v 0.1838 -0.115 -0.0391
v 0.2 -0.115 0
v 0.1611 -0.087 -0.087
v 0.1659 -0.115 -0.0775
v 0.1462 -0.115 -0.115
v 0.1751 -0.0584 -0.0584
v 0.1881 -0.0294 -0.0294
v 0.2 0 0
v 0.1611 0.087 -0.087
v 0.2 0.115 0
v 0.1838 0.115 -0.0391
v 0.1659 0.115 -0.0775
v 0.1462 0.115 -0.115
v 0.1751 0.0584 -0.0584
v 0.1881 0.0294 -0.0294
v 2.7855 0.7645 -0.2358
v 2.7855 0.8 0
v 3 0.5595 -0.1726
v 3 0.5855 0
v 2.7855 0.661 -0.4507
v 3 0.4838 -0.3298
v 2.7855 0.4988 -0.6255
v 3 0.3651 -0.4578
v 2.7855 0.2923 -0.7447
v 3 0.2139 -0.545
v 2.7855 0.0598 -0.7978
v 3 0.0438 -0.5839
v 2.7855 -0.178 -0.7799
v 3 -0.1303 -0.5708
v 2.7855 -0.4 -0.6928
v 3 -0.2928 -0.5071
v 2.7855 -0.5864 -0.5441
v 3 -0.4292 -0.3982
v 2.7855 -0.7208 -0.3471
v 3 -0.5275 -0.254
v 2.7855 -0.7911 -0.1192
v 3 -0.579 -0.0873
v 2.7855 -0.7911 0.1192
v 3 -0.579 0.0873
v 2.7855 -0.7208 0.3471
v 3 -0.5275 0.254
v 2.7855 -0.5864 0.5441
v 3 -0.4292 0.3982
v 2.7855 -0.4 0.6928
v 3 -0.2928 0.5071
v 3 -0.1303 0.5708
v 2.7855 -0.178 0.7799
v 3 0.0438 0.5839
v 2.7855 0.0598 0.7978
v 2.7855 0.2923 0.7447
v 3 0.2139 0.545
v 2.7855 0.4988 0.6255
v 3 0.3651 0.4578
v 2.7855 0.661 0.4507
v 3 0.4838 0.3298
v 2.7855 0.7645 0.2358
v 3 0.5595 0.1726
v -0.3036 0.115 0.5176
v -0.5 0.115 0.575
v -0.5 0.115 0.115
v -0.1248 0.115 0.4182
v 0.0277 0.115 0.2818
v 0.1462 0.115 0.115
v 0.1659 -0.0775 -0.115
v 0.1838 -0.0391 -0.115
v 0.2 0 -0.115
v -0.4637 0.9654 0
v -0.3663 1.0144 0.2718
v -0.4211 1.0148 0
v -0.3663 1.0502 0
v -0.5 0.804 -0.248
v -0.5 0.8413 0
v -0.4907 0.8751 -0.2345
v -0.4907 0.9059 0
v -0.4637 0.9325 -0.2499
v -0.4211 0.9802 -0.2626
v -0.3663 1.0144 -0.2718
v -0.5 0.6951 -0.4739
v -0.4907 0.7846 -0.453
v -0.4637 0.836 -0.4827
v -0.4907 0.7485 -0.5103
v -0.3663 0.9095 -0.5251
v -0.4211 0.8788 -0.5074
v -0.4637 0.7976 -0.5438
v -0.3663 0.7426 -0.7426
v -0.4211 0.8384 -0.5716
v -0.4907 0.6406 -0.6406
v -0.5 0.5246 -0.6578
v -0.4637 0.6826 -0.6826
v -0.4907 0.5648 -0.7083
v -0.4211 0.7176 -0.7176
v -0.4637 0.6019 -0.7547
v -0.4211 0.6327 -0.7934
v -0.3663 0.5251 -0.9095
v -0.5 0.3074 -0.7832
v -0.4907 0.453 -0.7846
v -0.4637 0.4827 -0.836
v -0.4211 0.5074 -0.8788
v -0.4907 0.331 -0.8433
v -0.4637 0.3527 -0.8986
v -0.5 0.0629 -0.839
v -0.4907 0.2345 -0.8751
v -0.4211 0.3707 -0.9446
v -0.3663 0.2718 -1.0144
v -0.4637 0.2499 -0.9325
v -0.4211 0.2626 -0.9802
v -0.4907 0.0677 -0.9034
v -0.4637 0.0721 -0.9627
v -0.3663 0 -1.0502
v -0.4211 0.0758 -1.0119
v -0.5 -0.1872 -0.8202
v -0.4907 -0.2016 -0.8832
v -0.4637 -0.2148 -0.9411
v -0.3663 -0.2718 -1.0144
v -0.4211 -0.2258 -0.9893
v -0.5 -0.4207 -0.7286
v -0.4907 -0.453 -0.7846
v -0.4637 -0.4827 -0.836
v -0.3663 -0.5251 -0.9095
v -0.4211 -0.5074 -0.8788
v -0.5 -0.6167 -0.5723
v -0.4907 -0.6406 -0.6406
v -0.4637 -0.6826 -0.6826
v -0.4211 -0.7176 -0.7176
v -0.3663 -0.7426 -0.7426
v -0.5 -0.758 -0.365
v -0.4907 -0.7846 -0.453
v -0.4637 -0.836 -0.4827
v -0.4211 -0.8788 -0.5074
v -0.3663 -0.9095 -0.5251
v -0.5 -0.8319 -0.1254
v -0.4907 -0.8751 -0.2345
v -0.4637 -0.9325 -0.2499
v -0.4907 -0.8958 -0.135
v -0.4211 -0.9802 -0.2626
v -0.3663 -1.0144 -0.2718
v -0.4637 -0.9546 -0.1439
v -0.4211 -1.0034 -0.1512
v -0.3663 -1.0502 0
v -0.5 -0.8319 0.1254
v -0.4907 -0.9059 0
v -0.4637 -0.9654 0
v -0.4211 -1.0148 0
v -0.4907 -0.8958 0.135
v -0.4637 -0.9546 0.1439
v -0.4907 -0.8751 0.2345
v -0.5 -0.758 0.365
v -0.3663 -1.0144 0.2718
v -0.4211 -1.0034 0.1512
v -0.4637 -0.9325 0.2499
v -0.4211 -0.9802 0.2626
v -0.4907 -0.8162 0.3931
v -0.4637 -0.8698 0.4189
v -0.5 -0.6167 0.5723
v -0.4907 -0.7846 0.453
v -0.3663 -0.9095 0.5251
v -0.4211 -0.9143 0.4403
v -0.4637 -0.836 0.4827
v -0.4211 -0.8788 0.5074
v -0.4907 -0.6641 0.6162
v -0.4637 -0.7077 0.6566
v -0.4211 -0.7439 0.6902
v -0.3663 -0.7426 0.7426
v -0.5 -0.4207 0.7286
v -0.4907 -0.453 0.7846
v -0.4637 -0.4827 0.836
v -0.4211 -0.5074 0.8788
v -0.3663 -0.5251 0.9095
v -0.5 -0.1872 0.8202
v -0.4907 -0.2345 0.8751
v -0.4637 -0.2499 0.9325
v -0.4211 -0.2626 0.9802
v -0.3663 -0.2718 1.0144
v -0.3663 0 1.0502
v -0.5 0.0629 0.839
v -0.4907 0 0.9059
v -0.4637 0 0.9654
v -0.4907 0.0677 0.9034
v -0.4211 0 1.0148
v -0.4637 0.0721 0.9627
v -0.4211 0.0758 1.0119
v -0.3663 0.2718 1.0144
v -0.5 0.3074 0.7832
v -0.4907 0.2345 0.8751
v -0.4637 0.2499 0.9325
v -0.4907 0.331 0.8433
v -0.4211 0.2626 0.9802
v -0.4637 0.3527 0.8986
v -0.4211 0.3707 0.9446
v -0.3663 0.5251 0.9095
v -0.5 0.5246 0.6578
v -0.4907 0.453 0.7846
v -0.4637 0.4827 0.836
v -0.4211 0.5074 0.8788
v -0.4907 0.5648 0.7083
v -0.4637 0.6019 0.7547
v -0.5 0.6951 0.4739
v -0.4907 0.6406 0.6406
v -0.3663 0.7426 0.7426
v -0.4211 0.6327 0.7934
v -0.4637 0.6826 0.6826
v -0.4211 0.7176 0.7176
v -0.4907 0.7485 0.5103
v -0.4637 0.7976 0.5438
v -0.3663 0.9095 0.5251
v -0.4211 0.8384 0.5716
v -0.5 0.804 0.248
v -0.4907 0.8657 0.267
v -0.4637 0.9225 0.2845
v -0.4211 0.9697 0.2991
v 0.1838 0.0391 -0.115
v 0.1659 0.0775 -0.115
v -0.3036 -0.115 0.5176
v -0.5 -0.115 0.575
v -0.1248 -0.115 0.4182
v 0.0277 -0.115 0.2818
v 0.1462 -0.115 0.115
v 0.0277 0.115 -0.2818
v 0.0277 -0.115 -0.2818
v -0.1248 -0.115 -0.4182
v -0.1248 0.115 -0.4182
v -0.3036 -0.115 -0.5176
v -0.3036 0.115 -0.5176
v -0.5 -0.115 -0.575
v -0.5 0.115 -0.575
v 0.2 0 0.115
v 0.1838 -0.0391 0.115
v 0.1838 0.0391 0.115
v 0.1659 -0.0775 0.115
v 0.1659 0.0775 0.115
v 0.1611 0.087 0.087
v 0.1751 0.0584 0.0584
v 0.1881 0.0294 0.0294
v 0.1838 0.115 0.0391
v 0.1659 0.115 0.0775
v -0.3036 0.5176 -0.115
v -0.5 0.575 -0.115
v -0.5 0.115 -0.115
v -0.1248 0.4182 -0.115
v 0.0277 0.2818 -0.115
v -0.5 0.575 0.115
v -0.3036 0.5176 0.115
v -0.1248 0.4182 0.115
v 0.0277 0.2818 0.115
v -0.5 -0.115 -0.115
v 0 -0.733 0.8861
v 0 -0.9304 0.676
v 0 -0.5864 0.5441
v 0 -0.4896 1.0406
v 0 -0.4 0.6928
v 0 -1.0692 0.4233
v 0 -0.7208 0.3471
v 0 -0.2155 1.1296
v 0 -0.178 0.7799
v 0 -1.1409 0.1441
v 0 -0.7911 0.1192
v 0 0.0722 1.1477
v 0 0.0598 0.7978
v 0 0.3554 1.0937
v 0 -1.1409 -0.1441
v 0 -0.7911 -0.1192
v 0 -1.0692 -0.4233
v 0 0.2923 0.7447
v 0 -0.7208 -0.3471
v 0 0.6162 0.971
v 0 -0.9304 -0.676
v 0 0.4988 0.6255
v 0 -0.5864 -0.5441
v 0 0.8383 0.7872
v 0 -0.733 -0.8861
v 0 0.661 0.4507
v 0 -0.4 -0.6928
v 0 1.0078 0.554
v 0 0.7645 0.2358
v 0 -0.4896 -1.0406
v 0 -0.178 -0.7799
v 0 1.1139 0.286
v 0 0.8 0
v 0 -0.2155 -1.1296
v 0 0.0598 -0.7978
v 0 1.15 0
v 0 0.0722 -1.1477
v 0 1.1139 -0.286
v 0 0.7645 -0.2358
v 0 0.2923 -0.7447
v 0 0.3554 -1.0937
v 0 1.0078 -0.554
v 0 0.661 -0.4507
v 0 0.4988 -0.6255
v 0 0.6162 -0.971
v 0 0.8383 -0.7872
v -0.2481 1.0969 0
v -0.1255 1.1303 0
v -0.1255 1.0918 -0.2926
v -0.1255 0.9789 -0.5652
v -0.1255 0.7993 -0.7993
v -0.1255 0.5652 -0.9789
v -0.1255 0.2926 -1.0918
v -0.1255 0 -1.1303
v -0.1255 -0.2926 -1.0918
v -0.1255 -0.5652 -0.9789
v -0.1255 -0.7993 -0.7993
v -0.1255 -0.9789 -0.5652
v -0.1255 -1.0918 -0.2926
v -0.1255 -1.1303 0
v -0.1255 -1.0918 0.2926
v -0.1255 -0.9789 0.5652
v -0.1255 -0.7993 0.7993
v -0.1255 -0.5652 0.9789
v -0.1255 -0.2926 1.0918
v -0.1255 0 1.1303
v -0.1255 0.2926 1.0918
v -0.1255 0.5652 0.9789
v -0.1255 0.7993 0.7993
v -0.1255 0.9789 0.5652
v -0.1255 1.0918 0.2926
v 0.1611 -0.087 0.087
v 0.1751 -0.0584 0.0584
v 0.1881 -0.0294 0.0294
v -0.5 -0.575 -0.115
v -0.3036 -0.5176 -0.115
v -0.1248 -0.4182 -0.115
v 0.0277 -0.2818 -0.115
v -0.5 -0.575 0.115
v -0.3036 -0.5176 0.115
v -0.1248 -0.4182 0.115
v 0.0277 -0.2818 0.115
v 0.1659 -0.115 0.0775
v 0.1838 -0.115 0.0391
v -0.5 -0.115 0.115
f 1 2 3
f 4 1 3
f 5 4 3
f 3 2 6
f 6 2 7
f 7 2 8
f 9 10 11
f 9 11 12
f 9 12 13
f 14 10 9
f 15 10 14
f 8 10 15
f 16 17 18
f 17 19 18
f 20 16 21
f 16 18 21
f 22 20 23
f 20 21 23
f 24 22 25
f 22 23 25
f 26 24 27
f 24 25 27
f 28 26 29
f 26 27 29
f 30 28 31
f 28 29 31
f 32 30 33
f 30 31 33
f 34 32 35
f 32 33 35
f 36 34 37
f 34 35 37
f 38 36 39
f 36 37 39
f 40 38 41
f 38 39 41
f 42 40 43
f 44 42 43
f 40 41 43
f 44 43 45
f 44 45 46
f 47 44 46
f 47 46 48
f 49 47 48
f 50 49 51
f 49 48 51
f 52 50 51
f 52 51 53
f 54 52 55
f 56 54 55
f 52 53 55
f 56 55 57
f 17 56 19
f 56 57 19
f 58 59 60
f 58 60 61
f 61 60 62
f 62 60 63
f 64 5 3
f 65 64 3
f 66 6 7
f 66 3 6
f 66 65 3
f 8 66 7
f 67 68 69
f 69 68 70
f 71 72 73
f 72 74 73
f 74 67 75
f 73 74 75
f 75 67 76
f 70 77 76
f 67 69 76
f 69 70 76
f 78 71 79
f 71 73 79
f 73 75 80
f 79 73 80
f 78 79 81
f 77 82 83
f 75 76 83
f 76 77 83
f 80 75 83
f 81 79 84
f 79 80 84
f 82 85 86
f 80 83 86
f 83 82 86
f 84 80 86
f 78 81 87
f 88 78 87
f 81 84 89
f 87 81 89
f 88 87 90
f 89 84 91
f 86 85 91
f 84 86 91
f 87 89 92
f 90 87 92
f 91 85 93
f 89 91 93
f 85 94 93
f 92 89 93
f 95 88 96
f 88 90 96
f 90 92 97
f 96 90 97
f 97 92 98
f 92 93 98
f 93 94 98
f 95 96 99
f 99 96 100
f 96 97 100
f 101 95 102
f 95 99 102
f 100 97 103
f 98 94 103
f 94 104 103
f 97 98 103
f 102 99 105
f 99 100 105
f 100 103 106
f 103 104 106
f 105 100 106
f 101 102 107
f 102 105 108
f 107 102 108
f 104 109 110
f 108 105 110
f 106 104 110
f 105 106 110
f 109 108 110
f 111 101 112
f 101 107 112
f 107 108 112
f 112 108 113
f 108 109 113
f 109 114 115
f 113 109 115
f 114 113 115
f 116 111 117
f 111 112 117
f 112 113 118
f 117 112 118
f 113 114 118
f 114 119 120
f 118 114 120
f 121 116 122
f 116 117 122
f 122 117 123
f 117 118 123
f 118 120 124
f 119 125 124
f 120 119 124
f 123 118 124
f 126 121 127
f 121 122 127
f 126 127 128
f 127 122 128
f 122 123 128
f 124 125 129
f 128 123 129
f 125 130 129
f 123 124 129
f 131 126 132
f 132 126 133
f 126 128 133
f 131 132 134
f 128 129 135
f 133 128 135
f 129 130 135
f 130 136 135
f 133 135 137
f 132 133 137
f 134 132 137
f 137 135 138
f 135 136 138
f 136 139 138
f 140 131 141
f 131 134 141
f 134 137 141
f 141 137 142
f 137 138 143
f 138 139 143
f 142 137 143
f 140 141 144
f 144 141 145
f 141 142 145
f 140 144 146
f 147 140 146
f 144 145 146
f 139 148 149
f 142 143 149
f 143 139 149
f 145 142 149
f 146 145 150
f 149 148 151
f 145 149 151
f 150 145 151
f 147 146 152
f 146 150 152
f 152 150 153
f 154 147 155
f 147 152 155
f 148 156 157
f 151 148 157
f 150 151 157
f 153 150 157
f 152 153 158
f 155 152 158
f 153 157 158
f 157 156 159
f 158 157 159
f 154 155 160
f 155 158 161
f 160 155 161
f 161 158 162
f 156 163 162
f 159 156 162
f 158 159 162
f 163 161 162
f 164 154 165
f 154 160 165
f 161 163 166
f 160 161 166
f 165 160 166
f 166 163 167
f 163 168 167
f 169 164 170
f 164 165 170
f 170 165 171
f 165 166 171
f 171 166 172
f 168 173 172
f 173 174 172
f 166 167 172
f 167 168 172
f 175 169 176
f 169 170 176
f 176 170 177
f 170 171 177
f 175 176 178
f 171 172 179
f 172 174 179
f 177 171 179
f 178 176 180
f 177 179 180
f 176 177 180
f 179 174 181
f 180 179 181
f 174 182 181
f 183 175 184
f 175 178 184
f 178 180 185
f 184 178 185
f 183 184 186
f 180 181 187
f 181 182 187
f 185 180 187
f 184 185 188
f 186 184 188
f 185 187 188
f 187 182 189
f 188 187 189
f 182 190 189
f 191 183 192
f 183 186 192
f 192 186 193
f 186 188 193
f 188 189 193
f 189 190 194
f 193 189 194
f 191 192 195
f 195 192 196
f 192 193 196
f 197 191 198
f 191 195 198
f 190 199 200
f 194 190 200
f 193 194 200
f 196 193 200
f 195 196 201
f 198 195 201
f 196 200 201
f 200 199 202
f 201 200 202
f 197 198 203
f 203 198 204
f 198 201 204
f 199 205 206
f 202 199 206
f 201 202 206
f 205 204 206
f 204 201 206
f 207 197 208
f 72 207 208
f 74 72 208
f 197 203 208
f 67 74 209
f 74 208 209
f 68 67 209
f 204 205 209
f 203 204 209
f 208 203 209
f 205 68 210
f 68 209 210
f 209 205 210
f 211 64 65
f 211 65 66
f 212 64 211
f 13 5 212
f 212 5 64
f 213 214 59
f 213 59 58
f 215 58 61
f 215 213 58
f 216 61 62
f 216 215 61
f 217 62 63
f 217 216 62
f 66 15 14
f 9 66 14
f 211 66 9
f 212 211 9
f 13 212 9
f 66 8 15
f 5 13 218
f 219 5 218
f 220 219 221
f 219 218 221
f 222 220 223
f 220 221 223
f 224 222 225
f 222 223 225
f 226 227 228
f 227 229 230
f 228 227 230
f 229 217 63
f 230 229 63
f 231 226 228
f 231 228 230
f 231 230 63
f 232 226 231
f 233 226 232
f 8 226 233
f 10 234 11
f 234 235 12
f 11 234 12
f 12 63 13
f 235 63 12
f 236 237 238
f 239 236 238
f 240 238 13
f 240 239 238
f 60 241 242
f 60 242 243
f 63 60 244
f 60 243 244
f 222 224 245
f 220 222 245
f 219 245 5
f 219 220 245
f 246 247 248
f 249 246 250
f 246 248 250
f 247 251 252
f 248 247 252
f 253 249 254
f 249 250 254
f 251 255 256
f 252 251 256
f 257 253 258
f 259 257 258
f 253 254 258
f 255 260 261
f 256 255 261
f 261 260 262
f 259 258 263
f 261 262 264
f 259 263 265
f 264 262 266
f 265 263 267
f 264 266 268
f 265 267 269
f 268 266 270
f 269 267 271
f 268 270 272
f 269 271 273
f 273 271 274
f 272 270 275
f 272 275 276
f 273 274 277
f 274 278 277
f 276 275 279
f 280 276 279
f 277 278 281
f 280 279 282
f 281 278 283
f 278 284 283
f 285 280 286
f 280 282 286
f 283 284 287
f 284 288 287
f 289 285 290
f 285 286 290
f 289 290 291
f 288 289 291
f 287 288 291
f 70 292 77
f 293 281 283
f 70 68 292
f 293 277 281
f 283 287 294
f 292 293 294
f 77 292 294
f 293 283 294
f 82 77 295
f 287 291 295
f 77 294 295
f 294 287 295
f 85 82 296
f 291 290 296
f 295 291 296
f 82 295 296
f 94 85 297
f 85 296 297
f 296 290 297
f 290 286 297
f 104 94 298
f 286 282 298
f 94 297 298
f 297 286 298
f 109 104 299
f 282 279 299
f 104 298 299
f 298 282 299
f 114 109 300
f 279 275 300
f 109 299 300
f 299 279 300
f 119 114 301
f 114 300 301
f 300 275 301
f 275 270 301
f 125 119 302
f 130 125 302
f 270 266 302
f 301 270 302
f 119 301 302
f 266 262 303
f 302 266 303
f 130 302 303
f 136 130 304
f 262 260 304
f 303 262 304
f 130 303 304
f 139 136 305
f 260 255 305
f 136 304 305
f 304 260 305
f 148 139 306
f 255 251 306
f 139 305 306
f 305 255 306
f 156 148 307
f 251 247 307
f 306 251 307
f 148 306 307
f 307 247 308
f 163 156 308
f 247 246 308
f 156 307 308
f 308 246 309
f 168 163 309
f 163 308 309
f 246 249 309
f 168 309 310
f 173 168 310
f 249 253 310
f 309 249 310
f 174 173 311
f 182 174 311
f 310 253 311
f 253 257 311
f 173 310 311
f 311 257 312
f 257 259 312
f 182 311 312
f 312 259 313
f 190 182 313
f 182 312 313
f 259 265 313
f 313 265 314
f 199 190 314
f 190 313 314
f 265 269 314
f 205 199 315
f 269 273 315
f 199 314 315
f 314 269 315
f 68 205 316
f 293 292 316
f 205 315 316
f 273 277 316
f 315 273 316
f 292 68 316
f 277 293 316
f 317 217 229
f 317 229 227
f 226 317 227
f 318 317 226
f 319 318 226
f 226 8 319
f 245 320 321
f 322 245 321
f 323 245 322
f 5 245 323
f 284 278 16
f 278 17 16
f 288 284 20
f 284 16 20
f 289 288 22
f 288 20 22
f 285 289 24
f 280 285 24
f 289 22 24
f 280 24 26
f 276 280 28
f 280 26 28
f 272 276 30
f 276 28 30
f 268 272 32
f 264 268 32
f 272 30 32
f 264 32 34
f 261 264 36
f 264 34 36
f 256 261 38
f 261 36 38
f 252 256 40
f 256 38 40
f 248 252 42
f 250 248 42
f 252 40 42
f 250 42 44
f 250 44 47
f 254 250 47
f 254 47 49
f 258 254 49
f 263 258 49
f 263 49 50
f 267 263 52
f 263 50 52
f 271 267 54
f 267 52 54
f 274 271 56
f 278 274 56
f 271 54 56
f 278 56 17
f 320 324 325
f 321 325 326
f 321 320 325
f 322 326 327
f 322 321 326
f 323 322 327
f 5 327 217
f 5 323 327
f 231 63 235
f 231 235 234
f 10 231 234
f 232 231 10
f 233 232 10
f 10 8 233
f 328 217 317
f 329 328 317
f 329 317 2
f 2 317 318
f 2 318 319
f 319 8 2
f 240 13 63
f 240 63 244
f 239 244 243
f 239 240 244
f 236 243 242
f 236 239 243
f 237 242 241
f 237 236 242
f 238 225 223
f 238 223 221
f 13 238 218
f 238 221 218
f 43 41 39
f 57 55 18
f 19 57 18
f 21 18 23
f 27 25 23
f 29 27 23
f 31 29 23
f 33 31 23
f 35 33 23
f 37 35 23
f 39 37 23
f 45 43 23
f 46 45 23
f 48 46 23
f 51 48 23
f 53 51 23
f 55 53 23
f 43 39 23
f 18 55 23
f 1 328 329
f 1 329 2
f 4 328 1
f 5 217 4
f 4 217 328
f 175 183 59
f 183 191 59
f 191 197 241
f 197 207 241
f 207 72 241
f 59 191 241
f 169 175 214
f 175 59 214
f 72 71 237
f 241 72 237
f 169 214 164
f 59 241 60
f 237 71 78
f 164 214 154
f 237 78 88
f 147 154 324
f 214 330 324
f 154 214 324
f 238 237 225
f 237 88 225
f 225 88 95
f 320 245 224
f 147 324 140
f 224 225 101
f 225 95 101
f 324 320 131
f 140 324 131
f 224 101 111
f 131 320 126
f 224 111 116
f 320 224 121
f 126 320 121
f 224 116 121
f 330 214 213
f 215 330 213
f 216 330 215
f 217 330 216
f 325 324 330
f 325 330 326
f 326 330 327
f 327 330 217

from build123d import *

# Parameters (mm, degrees)
CUT_EXTRUDE1_DEPTH      = 0.115
CUT_EXTRUDE1_DEPTH_BACK = 0.115
CUT_EXTRUDE2_DEPTH      = 0.115
CUT_EXTRUDE2_DEPTH_BACK = 0.115


with BuildPart() as part:
    # Sketch1 → Revolve1 (revolve)
    with BuildSketch(Plane.XY):
        with BuildLine():
            Line((-0.5, 0), (-0.5, 0.84133137))
            ThreePointArc((-0.5, 0.84133137), (-0.463697933, 0.965351975), (-0.366251212, 1.050222978))
            ThreePointArc((-0.366251212, 1.050222978), (-0.187270905, 1.115327627), (0, 1.15))
            Line((0, 1.15), (0, 0.8))
            Line((0, 0.8), (2.7855, 0.8))
            Line((2.7855, 0.8), (3, 0.5855))
            Line((3, 0.5855), (3, 0))
            Line((3, 0), (-0.5, 0))
        make_face()
    revolve(axis=Axis((3, 0, 0), (-1, 0, 0)))

    # Sketch2 → Cut-Extrude1 (cut, two sides: drawn at the far end of the back side and taken through both)
    with BuildSketch(Plane.XY.offset(-CUT_EXTRUDE1_DEPTH_BACK)):
        with BuildLine():
            Line((-0.5, 0.575), (-0.5, -0.575))
            ThreePointArc((-0.5, -0.575), (-0.07432444, -0.379626768), (0.2, 0))
            ThreePointArc((0.2, 0), (-0.07432444, 0.379626768), (-0.5, 0.575))
        make_face()
    extrude(amount=CUT_EXTRUDE1_DEPTH + CUT_EXTRUDE1_DEPTH_BACK, mode=Mode.SUBTRACT)

    # Sketch3 → Cut-Extrude2 (cut, two sides: drawn at the far end of the back side and taken through both)
    with BuildSketch(Plane(origin=(0, 0, 0), x_dir=(1, 0, 0), z_dir=(0, 1, 0)).offset(-CUT_EXTRUDE2_DEPTH_BACK)):
        with BuildLine():
            Line((-0.5, 0.575), (-0.5, -0.575))
            ThreePointArc((-0.5, -0.575), (-0.07432444, -0.379626768), (0.2, 0))
            ThreePointArc((0.2, 0), (-0.07432444, 0.379626768), (-0.5, 0.575))
        make_face()
    extrude(amount=CUT_EXTRUDE2_DEPTH + CUT_EXTRUDE2_DEPTH_BACK, mode=Mode.SUBTRACT)


solid = part.part
